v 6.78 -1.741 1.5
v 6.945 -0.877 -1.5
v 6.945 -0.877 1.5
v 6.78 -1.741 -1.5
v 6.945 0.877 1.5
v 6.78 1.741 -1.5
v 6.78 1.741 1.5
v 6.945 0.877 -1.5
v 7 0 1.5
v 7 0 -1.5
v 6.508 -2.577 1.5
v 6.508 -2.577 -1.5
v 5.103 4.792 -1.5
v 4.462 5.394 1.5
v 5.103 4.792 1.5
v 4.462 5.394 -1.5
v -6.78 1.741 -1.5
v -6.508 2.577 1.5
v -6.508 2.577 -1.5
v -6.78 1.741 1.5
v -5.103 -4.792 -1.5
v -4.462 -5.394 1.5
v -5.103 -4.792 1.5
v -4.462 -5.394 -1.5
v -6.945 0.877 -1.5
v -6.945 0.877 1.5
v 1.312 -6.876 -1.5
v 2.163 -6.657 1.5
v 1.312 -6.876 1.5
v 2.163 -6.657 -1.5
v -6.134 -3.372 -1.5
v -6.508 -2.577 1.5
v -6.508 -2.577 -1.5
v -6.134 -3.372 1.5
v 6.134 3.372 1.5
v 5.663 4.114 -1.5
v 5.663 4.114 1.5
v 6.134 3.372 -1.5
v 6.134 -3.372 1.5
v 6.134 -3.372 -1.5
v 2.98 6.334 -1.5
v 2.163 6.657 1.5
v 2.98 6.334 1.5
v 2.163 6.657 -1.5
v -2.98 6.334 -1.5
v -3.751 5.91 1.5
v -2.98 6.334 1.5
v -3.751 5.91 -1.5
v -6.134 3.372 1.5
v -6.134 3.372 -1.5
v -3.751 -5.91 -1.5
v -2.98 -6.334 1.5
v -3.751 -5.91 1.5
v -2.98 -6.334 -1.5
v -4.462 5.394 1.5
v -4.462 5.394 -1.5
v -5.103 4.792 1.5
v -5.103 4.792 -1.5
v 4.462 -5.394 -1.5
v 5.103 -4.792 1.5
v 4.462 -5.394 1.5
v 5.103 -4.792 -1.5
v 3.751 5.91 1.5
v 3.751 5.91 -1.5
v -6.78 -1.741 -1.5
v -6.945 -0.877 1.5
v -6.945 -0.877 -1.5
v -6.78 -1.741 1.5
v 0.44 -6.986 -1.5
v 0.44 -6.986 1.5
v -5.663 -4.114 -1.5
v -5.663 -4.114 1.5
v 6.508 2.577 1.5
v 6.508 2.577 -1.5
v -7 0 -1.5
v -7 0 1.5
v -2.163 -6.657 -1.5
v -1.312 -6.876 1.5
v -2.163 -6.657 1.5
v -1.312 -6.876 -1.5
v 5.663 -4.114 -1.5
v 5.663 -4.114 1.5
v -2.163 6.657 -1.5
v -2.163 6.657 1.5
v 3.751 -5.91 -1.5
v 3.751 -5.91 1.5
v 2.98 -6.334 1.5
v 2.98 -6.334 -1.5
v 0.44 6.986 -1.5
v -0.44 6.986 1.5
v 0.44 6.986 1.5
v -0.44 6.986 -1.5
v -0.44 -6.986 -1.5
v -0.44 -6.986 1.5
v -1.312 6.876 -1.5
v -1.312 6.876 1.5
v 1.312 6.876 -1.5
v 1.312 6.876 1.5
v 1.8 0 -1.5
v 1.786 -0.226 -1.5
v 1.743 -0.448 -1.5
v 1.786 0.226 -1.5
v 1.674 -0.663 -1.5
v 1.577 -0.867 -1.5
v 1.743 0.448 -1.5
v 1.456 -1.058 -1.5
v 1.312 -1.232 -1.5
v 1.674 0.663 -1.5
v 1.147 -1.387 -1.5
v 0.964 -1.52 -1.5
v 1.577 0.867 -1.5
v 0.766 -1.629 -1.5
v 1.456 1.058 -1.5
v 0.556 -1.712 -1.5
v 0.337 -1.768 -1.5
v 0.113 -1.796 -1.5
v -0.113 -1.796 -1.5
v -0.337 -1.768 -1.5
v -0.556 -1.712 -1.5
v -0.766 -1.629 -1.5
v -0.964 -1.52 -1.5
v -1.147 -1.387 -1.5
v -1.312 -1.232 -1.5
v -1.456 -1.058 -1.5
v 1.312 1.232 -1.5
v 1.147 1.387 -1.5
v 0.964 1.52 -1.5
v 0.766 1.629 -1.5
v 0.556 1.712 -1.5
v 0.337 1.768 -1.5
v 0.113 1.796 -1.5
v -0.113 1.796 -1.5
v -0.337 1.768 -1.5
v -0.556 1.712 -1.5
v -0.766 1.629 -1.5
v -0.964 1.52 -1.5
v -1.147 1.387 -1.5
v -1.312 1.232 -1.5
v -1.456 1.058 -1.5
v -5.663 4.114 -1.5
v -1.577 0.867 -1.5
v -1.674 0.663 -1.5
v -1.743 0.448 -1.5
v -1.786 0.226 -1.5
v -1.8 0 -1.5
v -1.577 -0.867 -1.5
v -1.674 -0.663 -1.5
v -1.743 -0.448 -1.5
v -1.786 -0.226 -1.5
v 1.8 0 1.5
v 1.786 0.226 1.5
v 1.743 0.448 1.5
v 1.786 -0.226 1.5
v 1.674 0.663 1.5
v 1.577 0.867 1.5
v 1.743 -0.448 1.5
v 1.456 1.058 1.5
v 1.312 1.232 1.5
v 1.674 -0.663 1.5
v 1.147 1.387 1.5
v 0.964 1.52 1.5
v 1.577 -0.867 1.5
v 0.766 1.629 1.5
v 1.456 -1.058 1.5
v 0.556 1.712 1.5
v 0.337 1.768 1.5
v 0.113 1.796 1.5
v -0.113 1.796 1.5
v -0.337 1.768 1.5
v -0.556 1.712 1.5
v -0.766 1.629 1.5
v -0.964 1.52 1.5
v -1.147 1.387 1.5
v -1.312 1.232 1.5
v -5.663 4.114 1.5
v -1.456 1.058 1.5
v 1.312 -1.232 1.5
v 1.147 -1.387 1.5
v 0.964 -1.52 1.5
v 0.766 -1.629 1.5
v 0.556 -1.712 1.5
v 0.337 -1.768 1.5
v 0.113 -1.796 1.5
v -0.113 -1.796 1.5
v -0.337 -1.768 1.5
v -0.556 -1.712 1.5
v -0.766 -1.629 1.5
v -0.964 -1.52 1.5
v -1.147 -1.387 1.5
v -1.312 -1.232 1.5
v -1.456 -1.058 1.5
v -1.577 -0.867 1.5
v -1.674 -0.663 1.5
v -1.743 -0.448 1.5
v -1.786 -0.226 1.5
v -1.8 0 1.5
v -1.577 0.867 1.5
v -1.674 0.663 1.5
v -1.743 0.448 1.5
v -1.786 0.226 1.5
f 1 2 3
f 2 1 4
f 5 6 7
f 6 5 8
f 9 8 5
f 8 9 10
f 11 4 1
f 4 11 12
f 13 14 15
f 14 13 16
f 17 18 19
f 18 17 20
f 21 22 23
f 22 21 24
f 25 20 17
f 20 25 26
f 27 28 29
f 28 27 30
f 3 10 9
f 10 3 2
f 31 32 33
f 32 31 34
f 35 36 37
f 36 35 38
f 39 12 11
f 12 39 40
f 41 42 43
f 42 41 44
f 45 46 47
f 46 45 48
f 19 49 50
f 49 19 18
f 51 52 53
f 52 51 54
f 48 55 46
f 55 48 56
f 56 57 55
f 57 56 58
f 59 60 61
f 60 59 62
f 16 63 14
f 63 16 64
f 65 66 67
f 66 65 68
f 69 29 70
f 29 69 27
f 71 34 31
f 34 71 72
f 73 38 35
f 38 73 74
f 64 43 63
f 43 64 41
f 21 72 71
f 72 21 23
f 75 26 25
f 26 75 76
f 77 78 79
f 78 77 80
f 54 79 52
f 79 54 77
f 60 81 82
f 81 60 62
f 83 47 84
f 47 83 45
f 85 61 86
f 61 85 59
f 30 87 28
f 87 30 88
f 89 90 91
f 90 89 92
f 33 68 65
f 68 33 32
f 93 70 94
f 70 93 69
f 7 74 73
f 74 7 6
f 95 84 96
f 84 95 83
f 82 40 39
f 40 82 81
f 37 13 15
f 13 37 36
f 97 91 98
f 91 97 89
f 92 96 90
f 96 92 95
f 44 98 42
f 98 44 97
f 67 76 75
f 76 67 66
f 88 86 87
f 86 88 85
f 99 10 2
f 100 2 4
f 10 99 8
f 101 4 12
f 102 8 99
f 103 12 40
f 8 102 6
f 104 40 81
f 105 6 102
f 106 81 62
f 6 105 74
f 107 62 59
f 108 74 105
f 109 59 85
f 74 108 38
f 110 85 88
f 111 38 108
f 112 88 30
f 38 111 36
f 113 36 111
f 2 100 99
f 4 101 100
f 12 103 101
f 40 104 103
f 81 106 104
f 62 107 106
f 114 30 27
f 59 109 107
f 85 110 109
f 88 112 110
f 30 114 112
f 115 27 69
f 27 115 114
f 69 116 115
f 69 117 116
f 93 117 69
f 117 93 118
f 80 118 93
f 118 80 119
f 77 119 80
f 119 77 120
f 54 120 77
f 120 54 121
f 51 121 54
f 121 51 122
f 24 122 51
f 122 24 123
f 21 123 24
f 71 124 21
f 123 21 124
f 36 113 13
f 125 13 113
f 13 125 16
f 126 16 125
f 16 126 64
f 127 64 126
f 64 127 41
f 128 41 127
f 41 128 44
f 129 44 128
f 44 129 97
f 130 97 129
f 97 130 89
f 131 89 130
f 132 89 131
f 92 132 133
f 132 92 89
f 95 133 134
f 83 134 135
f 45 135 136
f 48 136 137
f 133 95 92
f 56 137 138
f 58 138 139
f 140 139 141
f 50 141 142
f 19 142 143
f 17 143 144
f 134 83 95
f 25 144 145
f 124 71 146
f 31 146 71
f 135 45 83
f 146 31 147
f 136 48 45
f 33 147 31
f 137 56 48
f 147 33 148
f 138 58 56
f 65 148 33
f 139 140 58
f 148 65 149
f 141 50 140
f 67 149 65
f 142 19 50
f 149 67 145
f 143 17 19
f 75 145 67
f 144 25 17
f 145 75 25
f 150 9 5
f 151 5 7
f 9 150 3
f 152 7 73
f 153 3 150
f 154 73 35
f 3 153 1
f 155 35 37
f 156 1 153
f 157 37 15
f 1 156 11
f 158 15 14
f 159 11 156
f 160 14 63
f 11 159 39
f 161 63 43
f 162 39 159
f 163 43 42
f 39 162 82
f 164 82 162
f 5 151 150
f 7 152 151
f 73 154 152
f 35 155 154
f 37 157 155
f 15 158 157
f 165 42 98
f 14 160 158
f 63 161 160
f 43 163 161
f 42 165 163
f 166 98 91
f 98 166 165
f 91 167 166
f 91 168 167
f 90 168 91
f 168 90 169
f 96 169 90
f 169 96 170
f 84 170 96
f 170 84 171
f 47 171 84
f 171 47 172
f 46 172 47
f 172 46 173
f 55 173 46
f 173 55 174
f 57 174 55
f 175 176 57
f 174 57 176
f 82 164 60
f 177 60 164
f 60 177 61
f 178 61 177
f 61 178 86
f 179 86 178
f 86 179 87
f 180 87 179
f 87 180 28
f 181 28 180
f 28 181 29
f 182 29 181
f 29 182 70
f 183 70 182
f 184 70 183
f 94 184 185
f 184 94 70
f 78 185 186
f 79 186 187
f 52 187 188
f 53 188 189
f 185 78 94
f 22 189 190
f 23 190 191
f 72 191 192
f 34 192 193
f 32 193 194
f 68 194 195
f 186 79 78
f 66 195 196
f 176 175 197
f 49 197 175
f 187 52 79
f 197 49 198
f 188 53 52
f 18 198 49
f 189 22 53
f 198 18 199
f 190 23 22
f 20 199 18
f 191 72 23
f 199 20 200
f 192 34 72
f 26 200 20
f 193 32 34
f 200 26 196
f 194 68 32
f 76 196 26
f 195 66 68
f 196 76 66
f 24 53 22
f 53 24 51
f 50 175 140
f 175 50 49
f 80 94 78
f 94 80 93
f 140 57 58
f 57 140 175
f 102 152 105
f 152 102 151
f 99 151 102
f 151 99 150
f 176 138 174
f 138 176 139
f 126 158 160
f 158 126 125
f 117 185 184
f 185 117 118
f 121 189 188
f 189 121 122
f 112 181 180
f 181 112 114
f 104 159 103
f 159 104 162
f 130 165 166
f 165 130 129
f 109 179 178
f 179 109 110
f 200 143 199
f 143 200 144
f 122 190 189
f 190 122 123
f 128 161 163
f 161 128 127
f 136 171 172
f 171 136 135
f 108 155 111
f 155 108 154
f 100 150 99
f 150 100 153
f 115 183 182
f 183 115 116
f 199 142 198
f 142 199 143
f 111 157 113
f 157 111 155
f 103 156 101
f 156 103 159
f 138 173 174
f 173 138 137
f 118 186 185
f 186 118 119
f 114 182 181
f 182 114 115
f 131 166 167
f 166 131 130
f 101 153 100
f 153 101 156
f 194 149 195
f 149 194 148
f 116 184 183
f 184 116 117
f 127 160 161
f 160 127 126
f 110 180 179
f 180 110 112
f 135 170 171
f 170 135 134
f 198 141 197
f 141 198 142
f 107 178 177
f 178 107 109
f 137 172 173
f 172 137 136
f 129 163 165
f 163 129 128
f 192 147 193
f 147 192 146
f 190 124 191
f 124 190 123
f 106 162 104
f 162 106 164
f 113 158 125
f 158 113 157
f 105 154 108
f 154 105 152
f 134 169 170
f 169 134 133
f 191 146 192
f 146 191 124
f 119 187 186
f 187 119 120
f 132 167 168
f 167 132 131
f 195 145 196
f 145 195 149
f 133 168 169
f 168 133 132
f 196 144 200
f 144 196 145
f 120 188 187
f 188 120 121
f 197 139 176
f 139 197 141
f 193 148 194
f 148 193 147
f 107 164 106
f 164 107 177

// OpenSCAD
$fn = 50;


difference() {
	union() {
		translate(v = [0, 0, -1.5000000000]) {
			cylinder(h = 3, r = 7.0000000000);
		}
		translate(v = [0, 0, -1.5000000000]) {
			cylinder(h = 3, r = 2.8500000000);
		}
	}
	union() {
		translate(v = [0, 0, -100.0000000000]) {
			cylinder(h = 200, r = 1.8000000000);
		}
	}
}
